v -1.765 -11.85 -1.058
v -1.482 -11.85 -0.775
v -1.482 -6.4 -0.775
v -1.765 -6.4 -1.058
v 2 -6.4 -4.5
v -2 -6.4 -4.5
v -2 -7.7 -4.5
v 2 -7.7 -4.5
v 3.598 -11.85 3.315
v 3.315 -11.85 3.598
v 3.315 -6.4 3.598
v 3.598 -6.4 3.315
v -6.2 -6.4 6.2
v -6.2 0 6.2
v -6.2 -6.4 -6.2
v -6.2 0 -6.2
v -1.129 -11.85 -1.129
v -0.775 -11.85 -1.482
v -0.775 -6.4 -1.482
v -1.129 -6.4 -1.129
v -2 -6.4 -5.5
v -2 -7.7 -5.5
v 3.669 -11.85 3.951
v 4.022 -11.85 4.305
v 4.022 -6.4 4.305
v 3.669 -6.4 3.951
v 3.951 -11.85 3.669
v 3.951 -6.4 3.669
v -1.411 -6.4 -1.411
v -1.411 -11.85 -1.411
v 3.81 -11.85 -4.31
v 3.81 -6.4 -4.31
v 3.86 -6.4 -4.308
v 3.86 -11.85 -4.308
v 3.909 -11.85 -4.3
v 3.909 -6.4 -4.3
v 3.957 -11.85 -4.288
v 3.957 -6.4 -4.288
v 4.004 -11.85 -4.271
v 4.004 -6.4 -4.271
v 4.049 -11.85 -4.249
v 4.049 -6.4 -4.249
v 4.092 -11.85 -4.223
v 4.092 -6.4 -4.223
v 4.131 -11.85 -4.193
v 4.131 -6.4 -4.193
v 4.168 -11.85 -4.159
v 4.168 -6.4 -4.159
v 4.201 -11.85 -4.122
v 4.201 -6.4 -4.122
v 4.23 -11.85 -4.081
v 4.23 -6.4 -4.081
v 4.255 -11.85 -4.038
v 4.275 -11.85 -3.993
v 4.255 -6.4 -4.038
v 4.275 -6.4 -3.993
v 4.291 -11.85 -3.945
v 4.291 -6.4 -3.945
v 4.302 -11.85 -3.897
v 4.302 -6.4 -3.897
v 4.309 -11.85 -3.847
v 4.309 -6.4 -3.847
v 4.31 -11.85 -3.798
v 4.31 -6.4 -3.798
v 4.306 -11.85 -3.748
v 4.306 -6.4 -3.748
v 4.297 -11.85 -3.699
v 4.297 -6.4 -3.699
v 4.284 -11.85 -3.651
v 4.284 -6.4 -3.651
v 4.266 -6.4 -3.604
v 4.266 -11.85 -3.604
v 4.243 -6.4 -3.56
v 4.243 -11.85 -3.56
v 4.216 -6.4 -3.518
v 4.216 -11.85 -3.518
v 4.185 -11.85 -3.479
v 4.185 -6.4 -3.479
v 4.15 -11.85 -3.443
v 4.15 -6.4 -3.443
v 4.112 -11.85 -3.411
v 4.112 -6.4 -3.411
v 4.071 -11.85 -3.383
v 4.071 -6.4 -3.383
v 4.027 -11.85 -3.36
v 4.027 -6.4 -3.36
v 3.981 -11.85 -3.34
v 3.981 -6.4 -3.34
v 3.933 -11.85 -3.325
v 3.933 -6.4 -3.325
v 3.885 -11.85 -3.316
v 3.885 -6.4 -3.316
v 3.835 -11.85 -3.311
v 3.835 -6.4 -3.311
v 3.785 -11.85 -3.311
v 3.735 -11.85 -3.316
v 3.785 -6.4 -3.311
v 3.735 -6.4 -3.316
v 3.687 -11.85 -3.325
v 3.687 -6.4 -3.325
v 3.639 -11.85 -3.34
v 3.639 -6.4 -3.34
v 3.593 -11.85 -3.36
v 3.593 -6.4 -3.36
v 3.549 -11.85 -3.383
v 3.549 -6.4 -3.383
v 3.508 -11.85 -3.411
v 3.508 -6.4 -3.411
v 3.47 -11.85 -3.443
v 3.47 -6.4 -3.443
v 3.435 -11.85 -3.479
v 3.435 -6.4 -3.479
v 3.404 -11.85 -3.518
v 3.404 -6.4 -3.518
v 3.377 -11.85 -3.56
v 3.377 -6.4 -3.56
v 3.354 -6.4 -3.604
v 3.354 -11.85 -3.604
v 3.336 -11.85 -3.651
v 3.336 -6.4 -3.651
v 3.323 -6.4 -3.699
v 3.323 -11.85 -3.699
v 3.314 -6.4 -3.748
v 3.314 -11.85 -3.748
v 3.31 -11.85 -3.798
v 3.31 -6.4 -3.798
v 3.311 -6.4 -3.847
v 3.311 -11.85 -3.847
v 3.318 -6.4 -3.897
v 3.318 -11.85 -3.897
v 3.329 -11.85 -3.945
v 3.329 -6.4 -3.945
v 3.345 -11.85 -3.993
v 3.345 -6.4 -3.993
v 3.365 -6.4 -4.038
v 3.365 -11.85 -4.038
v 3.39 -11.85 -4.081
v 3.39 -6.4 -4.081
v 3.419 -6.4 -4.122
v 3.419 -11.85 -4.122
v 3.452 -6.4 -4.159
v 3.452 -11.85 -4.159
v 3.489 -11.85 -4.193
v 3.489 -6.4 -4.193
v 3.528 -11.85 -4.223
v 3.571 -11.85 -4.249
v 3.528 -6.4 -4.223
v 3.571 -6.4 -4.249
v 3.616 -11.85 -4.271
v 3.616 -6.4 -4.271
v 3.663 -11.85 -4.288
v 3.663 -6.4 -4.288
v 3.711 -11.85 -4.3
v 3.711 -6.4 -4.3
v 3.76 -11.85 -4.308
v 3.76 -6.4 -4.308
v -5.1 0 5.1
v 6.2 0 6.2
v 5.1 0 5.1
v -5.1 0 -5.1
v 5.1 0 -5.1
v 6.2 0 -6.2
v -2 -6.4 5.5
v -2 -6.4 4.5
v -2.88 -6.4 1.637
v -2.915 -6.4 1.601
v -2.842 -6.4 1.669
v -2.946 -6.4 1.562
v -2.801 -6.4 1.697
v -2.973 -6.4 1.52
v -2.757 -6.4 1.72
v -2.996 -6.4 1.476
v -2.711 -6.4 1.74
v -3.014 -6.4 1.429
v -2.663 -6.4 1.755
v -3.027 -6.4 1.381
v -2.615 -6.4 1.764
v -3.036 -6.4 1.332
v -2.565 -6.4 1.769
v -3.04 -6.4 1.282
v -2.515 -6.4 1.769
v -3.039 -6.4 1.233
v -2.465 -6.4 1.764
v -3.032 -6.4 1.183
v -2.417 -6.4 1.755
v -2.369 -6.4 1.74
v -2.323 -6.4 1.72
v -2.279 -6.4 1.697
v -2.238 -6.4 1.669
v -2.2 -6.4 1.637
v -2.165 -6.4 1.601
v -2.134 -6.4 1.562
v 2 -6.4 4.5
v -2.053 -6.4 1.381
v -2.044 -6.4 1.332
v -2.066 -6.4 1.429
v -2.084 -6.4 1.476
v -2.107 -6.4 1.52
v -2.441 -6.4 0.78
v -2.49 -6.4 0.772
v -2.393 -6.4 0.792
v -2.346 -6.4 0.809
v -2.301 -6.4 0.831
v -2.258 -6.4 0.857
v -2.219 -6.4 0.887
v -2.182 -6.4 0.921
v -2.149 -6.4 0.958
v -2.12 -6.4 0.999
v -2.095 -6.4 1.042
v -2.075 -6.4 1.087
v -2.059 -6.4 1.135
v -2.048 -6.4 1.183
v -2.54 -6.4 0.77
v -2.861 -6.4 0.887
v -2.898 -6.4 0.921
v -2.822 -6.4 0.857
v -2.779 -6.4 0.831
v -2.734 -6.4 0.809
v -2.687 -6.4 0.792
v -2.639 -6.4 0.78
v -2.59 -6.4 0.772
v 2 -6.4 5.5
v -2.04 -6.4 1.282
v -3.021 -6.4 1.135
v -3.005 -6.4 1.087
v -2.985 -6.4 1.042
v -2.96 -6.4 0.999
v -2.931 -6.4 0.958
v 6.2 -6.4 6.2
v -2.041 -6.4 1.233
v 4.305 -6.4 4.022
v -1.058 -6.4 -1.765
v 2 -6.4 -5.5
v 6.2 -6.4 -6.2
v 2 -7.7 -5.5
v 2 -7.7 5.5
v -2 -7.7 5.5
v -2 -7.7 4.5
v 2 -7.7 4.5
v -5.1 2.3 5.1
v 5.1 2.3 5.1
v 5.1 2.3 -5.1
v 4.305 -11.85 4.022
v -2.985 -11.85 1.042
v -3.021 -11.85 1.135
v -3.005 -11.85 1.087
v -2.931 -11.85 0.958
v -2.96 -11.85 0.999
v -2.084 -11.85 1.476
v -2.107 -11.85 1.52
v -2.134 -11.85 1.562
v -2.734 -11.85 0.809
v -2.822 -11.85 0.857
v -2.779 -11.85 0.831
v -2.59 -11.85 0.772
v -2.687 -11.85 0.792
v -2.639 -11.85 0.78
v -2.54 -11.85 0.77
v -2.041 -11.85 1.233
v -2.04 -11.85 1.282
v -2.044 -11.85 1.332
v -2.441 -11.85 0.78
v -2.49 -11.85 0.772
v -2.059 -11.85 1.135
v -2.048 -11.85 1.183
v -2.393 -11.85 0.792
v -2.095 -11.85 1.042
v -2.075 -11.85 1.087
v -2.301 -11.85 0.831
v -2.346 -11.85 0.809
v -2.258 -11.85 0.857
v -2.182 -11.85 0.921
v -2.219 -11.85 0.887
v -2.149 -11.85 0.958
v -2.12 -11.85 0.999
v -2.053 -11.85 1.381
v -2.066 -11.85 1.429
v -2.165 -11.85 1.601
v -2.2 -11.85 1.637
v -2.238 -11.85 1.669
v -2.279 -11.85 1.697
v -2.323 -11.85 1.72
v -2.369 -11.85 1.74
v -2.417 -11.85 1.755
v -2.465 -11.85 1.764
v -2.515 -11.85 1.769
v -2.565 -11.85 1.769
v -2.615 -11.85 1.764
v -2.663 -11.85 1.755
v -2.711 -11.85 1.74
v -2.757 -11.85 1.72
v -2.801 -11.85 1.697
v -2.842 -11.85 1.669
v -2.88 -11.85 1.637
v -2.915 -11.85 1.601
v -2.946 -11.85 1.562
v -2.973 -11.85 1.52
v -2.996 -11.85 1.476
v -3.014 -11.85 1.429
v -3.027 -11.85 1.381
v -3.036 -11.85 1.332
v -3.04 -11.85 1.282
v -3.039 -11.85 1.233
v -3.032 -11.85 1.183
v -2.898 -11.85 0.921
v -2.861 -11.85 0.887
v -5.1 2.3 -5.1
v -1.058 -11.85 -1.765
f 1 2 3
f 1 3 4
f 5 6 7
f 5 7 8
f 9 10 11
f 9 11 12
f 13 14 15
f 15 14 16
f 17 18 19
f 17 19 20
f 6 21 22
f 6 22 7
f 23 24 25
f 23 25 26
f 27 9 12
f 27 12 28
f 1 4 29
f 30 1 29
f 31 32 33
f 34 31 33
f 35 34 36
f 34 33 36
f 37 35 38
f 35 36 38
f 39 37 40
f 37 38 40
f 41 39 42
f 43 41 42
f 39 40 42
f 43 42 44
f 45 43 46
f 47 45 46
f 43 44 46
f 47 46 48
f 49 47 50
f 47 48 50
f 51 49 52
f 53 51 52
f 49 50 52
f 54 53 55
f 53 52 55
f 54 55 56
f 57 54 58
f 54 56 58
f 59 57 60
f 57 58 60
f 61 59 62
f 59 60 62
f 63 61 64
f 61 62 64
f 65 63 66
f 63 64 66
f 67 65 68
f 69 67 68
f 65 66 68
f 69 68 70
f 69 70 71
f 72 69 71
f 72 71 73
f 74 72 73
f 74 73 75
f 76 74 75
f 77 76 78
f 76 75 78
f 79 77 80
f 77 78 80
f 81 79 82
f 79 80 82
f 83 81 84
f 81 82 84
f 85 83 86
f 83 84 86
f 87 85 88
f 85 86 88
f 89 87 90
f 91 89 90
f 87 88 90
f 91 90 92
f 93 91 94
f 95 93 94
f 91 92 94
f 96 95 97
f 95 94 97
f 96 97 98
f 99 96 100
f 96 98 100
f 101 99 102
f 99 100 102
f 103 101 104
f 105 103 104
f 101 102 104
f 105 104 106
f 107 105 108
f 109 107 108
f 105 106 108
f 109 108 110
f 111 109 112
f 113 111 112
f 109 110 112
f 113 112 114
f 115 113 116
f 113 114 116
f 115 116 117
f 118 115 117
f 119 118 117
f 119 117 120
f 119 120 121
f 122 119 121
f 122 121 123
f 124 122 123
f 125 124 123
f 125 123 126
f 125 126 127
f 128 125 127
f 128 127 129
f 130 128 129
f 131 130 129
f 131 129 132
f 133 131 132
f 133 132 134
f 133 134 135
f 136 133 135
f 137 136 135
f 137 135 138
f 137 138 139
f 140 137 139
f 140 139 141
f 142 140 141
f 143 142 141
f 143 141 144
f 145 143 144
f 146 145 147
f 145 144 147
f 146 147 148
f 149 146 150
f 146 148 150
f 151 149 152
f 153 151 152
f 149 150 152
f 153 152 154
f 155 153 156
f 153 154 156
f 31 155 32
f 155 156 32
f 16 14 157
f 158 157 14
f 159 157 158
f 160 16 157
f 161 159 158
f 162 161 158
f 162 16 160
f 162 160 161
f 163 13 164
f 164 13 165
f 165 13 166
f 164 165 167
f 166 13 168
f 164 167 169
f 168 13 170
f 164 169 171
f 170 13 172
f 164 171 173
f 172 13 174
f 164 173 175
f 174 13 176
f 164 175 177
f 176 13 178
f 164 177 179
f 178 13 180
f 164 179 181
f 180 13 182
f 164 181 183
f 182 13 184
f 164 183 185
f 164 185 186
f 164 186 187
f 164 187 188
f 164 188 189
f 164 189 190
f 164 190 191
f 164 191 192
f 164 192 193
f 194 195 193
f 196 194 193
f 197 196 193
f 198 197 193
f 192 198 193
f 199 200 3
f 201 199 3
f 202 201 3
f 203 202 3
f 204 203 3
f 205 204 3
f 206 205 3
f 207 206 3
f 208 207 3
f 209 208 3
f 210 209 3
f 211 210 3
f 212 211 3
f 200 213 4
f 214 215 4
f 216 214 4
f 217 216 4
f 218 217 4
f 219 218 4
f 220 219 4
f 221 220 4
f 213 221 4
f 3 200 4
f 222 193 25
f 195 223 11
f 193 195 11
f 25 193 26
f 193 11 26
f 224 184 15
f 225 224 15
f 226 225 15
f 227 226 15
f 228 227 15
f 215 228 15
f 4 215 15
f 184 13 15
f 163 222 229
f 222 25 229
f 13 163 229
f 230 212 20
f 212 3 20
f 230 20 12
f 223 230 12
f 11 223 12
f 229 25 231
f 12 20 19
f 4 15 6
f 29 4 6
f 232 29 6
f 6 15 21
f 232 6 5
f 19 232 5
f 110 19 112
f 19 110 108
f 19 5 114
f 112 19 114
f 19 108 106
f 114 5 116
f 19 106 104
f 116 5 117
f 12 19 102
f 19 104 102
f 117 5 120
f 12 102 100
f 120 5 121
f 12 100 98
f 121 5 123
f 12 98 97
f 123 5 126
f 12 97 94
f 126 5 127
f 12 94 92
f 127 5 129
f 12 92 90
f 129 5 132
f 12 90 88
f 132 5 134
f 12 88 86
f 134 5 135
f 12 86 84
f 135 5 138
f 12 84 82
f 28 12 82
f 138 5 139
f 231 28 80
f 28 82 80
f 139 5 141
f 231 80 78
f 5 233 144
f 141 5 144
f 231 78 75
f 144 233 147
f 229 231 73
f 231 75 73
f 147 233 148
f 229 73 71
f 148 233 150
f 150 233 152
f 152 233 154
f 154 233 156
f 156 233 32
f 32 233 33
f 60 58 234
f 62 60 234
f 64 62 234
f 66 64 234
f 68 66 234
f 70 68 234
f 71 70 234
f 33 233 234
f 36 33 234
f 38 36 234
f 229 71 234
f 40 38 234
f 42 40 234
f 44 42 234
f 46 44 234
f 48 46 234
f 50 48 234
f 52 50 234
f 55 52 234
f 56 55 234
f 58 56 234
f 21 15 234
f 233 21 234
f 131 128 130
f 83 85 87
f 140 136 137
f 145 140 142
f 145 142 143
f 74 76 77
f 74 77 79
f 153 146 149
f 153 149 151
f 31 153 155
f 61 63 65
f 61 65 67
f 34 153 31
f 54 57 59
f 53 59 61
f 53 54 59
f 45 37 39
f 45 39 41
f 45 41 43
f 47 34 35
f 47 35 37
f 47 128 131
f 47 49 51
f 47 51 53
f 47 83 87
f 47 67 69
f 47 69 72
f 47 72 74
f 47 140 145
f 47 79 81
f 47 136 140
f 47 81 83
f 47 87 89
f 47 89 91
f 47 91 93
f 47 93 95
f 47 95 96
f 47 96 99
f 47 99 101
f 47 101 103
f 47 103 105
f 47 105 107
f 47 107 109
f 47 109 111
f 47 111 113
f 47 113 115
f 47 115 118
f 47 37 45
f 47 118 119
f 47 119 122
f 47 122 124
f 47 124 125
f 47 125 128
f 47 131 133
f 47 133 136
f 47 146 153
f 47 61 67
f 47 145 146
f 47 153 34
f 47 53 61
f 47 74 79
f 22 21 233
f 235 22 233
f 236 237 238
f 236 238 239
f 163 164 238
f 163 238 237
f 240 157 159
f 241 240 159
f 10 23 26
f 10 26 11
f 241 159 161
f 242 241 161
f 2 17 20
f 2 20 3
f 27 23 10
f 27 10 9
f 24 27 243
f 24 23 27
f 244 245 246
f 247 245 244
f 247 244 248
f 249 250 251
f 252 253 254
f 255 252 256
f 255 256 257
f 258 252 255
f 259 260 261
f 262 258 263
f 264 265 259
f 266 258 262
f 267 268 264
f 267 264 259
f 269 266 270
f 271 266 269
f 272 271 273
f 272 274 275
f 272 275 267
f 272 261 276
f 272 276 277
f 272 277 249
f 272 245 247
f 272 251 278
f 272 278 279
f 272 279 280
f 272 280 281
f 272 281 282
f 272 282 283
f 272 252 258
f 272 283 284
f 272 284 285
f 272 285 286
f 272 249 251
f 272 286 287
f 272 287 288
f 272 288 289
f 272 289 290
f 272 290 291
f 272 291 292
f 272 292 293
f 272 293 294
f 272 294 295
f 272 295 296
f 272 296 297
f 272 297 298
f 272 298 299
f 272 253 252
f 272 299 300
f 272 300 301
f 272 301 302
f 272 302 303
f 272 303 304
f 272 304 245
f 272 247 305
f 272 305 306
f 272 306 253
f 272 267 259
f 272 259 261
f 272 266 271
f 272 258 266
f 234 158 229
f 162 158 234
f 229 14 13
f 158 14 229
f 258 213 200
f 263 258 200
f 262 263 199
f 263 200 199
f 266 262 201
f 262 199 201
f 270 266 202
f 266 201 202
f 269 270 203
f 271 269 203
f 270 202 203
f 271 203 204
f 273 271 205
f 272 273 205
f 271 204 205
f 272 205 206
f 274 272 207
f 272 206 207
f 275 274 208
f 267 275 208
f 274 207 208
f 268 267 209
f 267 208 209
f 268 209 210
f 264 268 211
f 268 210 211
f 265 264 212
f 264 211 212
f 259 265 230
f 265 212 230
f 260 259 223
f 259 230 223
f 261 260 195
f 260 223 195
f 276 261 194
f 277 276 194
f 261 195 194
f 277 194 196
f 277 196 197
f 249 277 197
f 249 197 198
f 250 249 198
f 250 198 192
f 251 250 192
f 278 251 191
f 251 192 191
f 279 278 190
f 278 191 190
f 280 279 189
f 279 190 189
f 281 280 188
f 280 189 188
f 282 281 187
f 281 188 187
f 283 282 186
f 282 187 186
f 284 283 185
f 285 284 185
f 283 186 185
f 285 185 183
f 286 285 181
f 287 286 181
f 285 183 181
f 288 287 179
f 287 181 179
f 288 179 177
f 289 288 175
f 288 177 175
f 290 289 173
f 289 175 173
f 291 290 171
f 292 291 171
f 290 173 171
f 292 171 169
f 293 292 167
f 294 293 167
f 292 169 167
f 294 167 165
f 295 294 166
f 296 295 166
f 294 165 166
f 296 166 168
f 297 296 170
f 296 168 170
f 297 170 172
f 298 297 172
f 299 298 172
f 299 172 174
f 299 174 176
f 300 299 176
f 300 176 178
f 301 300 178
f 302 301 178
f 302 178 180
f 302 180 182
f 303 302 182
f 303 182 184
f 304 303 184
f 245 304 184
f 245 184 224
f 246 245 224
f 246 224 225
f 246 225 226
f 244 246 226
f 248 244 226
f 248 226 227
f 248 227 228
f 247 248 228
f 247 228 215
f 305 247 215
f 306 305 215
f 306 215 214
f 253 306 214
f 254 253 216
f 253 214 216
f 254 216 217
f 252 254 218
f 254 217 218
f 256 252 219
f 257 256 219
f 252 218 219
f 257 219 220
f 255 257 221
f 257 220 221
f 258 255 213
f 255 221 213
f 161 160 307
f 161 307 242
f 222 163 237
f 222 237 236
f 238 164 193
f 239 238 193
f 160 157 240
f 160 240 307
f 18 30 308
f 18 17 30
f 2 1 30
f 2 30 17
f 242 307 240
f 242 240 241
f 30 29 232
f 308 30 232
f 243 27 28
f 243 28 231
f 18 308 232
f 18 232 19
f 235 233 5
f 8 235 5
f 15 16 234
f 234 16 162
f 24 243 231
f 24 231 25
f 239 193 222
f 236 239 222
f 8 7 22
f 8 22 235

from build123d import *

# Parameters (mm, degrees)
SKETCH1_W           = 12.4
SKETCH1_H           = 12.4
BOSS_EXTRUDE1_DEPTH = 6.4
SKETCH2_W           = 10.2
SKETCH2_H           = 10.2
BOSS_EXTRUDE2_DEPTH = 2.3
SKETCH3_R           = 0.5
BOSS_EXTRUDE3_DEPTH = 5.45
SKETCH4_W           = 4
SKETCH4_H           = 1
BOSS_EXTRUDE4_DEPTH = 1.3


with BuildPart() as part:
    # Sketch1 → Boss-Extrude1 (new body)
    with BuildSketch(Plane(origin=(0, 0, 0), x_dir=(1, 0, 0), z_dir=(0, 1, 0))):
        Rectangle(SKETCH1_W, SKETCH1_H)
    extrude(amount=-BOSS_EXTRUDE1_DEPTH)

    # Sketch2 → Boss-Extrude2 (add)
    with BuildSketch(Plane(origin=(0, 0, 0), x_dir=(1, 0, 0), z_dir=(0, 1, 0))):
        Rectangle(SKETCH2_W, SKETCH2_H)
    extrude(amount=BOSS_EXTRUDE2_DEPTH)

    # Sketch3 → Boss-Extrude3 (add)
    with BuildSketch(Plane.XZ.offset(6.4)):
        with Locations(Location((-2.54, 1.27, 0), (0, 0, 270))):
            Circle(SKETCH3_R)
        Polygon((4.304974747, 4.022132034), (4.022132034, 4.304974747), (3.668578644, 3.951421356), (3.951421356, 3.668578644), align=None)
        Polygon((3.951421356, 3.668578644), (3.668578644, 3.951421356), (3.315025253, 3.597867966), (3.597867966, 3.315025253), align=None)
        with Locations(Location((3.81, -3.81, 0), (0, 0, 270))):
            Circle(SKETCH3_R)
        Polygon((-0.775025253, -1.482132034), (-1.128578644, -1.128578644), (-1.411421356, -1.411421356), (-1.057867966, -1.764974747), align=None)
        Polygon((-1.128578644, -1.128578644), (-1.482132034, -0.775025253), (-1.764974747, -1.057867966), (-1.411421356, -1.411421356), align=None)
    extrude(amount=BOSS_EXTRUDE3_DEPTH)

    # Sketch4 → Boss-Extrude4 (add)
    with BuildSketch(Plane.XZ.offset(6.4)):
        with Locations((0, -5)):
            Rectangle(SKETCH4_W, SKETCH4_H)
        with Locations((0, 5)):
            Rectangle(SKETCH4_W, SKETCH4_H)
    extrude(amount=BOSS_EXTRUDE4_DEPTH)


solid = part.part
